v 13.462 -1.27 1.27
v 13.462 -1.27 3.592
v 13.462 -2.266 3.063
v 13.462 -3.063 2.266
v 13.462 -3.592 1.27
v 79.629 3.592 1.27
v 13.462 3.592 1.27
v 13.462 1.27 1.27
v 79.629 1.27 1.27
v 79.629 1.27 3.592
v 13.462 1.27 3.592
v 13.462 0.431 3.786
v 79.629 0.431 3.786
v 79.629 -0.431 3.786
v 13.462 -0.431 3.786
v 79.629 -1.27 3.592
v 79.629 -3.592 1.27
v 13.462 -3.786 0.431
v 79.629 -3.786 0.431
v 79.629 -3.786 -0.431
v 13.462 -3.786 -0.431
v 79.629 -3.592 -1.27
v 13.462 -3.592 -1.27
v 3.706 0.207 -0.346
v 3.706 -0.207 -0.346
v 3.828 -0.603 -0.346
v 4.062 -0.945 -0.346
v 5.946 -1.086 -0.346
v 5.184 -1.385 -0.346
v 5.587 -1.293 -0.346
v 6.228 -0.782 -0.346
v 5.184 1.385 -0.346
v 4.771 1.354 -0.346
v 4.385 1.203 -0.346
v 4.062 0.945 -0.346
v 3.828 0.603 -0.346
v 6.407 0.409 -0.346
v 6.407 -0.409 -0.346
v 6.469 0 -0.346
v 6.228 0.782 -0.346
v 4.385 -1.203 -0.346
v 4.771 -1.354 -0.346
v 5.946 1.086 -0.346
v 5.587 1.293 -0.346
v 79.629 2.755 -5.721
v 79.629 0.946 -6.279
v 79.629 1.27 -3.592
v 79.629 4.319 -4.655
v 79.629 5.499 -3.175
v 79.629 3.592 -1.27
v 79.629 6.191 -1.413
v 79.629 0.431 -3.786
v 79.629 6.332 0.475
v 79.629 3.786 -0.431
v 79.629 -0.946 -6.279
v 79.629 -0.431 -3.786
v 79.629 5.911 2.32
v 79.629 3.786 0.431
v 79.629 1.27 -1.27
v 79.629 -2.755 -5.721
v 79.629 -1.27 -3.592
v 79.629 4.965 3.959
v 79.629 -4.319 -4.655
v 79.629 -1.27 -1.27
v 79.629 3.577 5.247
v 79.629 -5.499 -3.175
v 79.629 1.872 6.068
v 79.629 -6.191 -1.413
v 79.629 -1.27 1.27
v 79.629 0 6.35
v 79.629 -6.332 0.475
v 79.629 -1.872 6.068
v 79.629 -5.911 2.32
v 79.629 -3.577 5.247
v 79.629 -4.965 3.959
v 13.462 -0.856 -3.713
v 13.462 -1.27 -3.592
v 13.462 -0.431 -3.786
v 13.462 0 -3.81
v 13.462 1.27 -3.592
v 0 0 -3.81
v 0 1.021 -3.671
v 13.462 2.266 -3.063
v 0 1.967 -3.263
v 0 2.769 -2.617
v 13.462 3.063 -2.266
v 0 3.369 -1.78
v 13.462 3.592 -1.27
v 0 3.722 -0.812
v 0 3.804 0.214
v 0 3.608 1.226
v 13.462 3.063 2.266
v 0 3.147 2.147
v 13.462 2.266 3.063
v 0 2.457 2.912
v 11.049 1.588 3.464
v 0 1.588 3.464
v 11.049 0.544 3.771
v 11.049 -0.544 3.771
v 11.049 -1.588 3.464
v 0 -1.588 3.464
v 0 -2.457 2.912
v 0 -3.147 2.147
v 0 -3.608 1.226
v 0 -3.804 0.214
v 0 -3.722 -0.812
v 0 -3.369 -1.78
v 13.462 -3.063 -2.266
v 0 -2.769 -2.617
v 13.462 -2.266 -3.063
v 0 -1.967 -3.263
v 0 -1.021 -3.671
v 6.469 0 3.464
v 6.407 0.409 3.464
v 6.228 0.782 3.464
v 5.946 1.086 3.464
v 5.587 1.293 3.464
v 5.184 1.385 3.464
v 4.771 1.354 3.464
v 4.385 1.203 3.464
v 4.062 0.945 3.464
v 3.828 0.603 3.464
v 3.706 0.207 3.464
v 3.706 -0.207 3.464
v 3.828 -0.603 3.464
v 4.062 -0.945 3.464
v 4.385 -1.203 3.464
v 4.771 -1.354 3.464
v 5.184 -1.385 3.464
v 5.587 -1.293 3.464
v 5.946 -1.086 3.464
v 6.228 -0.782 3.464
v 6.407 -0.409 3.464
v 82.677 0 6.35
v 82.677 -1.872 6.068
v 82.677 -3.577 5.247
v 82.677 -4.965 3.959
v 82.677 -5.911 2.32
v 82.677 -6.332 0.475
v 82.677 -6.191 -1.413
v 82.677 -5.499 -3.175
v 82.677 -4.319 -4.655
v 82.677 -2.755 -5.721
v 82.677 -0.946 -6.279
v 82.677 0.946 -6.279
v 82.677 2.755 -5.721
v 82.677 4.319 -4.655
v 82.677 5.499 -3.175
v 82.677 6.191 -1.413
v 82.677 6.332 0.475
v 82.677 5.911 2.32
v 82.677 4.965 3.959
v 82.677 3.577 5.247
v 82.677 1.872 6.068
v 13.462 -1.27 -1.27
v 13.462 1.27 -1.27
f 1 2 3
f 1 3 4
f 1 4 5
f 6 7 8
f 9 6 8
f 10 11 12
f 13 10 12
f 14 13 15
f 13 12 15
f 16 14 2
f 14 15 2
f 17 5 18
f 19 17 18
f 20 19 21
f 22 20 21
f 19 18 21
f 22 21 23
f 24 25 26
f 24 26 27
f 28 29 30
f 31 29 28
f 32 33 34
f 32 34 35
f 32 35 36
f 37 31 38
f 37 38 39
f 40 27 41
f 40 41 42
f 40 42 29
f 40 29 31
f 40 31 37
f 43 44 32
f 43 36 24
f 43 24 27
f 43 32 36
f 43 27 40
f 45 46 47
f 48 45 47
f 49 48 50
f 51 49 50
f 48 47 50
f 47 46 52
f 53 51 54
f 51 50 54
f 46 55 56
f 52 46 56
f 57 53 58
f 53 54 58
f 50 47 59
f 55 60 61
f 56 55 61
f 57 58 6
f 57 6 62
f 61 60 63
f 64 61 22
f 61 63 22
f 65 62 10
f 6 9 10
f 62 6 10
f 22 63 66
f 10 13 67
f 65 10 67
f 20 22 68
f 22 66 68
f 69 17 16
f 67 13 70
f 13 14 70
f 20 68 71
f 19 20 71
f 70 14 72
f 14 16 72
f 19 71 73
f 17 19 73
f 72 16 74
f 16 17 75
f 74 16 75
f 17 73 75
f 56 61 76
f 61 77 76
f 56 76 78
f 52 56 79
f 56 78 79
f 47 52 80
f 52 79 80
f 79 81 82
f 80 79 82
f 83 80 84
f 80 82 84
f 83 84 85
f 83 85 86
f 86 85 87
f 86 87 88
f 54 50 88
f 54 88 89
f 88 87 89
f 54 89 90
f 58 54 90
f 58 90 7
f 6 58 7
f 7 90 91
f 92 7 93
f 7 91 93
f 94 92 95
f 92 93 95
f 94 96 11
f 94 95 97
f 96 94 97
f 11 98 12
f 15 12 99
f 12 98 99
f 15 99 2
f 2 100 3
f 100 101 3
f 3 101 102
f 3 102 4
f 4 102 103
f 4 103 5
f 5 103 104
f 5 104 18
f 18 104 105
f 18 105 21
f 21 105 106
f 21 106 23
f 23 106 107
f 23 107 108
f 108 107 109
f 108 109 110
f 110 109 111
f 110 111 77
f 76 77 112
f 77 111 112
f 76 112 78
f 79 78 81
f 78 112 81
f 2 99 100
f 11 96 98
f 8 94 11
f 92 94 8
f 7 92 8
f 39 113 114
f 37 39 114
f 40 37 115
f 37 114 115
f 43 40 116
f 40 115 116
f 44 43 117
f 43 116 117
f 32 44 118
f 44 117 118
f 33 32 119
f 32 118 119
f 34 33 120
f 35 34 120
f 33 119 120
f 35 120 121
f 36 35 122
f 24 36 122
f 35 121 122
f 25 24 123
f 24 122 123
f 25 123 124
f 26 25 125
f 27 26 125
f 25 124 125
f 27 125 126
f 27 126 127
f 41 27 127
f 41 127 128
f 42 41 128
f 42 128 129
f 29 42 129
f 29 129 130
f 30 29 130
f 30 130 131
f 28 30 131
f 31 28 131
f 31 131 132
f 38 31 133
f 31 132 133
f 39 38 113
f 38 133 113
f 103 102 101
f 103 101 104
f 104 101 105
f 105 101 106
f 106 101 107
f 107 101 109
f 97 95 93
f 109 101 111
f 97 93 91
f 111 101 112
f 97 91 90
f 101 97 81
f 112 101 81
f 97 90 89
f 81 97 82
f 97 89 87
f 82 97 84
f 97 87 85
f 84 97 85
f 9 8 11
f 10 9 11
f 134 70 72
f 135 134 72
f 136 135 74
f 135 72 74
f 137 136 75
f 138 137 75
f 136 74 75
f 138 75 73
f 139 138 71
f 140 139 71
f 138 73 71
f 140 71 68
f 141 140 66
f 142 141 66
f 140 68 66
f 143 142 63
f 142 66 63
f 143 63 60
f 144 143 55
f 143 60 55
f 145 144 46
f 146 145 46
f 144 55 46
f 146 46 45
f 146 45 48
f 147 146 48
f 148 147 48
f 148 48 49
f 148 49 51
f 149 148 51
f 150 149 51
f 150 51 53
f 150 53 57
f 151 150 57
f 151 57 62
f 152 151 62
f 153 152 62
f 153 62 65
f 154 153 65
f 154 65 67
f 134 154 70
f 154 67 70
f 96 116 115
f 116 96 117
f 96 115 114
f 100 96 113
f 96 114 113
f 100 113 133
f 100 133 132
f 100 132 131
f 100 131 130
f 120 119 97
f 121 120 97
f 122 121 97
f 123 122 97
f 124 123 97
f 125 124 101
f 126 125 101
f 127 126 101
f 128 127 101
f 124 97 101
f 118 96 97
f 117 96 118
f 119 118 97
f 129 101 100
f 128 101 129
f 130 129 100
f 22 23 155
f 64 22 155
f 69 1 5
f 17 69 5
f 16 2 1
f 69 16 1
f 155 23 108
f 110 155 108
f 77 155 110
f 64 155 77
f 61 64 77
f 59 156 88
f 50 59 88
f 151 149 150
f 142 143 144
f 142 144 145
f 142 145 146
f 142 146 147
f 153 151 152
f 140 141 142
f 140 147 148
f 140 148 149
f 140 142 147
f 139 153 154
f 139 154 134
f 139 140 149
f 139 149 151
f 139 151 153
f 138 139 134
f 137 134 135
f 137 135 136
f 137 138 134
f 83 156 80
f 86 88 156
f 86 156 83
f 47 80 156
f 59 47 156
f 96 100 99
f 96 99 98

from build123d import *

# Parameters (mm, degrees)
SKETCH1_R           = 3.81
BASE_EXTRUDE_DEPTH  = 13.462
BOSS_EXTRUDE4_DEPTH = 66.167
SKETCH3_R           = 6.35
BOSS_EXTRUDE5_DEPTH = 3.048
CUT_EXTRUDE1_DEPTH  = 11.049
SKETCH5_R           = 1.3890625
CUT_EXTRUDE2_DEPTH  = 3.81


with BuildPart() as part:
    # Sketch1 → Base-Extrude (new body)
    with BuildSketch(Plane(origin=(0, 0, 0), x_dir=(0, 0, -1), z_dir=(1, 0, 0))):
        Circle(SKETCH1_R)
    extrude(amount=BASE_EXTRUDE_DEPTH)

    # Sketch2 → Boss-Extrude4 (add)
    with BuildSketch(Plane(origin=(13.462, 0, 0), x_dir=(0, 0, -1), z_dir=(1, 0, 0))):
        with BuildLine():
            Line((1.27, -3.592102448), (1.27, -1.27))
            Line((1.27, -1.27), (3.592102448, -1.27))
            ThreePointArc((3.592102448, -1.27), (3.81, 0), (3.592102448, 1.27))
            Line((3.592102448, 1.27), (1.27, 1.27))
            Line((1.27, 1.27), (1.27, 3.592102448))
            ThreePointArc((1.27, 3.592102448), (0, 3.81), (-1.27, 3.592102448))
            Line((-1.27, 3.592102448), (-1.27, 1.27))
            Line((-1.27, 1.27), (-3.592102448, 1.27))
            ThreePointArc((-3.592102448, 1.27), (-3.81, 0), (-3.592102448, -1.27))
            Line((-3.592102448, -1.27), (-1.27, -1.27))
            Line((-1.27, -1.27), (-1.27, -3.592102448))
            ThreePointArc((-1.27, -3.592102448), (0, -3.81), (1.27, -3.592102448))
        make_face()
    extrude(amount=BOSS_EXTRUDE4_DEPTH)

    # Sketch3 → Boss-Extrude5 (add)
    with BuildSketch(Plane(origin=(79.629, 0, 0), x_dir=(0, 0, -1), z_dir=(1, 0, 0))):
        with Locations(Location((0, 0, 0), (0, 0, 180))):
            Circle(SKETCH3_R)
    extrude(amount=BOSS_EXTRUDE5_DEPTH)

    # Sketch4 → Cut-Extrude1 (cut)
    with BuildSketch(Plane.ZY):
        with BuildLine():
            Line((3.463516096, 1.5875), (3.463516096, -1.5875))
            ThreePointArc((3.463516096, -1.5875), (3.81, 0), (3.463516096, 1.5875))
        make_face()
    extrude(amount=-CUT_EXTRUDE1_DEPTH, mode=Mode.SUBTRACT)

    # Sketch5 → Cut-Extrude2 (cut)
    with BuildSketch(Plane.XY.offset(3.463516096)):
        with Locations((5.08, 0)):
            Circle(SKETCH5_R)
    extrude(amount=-CUT_EXTRUDE2_DEPTH, mode=Mode.SUBTRACT)


solid = part.part
